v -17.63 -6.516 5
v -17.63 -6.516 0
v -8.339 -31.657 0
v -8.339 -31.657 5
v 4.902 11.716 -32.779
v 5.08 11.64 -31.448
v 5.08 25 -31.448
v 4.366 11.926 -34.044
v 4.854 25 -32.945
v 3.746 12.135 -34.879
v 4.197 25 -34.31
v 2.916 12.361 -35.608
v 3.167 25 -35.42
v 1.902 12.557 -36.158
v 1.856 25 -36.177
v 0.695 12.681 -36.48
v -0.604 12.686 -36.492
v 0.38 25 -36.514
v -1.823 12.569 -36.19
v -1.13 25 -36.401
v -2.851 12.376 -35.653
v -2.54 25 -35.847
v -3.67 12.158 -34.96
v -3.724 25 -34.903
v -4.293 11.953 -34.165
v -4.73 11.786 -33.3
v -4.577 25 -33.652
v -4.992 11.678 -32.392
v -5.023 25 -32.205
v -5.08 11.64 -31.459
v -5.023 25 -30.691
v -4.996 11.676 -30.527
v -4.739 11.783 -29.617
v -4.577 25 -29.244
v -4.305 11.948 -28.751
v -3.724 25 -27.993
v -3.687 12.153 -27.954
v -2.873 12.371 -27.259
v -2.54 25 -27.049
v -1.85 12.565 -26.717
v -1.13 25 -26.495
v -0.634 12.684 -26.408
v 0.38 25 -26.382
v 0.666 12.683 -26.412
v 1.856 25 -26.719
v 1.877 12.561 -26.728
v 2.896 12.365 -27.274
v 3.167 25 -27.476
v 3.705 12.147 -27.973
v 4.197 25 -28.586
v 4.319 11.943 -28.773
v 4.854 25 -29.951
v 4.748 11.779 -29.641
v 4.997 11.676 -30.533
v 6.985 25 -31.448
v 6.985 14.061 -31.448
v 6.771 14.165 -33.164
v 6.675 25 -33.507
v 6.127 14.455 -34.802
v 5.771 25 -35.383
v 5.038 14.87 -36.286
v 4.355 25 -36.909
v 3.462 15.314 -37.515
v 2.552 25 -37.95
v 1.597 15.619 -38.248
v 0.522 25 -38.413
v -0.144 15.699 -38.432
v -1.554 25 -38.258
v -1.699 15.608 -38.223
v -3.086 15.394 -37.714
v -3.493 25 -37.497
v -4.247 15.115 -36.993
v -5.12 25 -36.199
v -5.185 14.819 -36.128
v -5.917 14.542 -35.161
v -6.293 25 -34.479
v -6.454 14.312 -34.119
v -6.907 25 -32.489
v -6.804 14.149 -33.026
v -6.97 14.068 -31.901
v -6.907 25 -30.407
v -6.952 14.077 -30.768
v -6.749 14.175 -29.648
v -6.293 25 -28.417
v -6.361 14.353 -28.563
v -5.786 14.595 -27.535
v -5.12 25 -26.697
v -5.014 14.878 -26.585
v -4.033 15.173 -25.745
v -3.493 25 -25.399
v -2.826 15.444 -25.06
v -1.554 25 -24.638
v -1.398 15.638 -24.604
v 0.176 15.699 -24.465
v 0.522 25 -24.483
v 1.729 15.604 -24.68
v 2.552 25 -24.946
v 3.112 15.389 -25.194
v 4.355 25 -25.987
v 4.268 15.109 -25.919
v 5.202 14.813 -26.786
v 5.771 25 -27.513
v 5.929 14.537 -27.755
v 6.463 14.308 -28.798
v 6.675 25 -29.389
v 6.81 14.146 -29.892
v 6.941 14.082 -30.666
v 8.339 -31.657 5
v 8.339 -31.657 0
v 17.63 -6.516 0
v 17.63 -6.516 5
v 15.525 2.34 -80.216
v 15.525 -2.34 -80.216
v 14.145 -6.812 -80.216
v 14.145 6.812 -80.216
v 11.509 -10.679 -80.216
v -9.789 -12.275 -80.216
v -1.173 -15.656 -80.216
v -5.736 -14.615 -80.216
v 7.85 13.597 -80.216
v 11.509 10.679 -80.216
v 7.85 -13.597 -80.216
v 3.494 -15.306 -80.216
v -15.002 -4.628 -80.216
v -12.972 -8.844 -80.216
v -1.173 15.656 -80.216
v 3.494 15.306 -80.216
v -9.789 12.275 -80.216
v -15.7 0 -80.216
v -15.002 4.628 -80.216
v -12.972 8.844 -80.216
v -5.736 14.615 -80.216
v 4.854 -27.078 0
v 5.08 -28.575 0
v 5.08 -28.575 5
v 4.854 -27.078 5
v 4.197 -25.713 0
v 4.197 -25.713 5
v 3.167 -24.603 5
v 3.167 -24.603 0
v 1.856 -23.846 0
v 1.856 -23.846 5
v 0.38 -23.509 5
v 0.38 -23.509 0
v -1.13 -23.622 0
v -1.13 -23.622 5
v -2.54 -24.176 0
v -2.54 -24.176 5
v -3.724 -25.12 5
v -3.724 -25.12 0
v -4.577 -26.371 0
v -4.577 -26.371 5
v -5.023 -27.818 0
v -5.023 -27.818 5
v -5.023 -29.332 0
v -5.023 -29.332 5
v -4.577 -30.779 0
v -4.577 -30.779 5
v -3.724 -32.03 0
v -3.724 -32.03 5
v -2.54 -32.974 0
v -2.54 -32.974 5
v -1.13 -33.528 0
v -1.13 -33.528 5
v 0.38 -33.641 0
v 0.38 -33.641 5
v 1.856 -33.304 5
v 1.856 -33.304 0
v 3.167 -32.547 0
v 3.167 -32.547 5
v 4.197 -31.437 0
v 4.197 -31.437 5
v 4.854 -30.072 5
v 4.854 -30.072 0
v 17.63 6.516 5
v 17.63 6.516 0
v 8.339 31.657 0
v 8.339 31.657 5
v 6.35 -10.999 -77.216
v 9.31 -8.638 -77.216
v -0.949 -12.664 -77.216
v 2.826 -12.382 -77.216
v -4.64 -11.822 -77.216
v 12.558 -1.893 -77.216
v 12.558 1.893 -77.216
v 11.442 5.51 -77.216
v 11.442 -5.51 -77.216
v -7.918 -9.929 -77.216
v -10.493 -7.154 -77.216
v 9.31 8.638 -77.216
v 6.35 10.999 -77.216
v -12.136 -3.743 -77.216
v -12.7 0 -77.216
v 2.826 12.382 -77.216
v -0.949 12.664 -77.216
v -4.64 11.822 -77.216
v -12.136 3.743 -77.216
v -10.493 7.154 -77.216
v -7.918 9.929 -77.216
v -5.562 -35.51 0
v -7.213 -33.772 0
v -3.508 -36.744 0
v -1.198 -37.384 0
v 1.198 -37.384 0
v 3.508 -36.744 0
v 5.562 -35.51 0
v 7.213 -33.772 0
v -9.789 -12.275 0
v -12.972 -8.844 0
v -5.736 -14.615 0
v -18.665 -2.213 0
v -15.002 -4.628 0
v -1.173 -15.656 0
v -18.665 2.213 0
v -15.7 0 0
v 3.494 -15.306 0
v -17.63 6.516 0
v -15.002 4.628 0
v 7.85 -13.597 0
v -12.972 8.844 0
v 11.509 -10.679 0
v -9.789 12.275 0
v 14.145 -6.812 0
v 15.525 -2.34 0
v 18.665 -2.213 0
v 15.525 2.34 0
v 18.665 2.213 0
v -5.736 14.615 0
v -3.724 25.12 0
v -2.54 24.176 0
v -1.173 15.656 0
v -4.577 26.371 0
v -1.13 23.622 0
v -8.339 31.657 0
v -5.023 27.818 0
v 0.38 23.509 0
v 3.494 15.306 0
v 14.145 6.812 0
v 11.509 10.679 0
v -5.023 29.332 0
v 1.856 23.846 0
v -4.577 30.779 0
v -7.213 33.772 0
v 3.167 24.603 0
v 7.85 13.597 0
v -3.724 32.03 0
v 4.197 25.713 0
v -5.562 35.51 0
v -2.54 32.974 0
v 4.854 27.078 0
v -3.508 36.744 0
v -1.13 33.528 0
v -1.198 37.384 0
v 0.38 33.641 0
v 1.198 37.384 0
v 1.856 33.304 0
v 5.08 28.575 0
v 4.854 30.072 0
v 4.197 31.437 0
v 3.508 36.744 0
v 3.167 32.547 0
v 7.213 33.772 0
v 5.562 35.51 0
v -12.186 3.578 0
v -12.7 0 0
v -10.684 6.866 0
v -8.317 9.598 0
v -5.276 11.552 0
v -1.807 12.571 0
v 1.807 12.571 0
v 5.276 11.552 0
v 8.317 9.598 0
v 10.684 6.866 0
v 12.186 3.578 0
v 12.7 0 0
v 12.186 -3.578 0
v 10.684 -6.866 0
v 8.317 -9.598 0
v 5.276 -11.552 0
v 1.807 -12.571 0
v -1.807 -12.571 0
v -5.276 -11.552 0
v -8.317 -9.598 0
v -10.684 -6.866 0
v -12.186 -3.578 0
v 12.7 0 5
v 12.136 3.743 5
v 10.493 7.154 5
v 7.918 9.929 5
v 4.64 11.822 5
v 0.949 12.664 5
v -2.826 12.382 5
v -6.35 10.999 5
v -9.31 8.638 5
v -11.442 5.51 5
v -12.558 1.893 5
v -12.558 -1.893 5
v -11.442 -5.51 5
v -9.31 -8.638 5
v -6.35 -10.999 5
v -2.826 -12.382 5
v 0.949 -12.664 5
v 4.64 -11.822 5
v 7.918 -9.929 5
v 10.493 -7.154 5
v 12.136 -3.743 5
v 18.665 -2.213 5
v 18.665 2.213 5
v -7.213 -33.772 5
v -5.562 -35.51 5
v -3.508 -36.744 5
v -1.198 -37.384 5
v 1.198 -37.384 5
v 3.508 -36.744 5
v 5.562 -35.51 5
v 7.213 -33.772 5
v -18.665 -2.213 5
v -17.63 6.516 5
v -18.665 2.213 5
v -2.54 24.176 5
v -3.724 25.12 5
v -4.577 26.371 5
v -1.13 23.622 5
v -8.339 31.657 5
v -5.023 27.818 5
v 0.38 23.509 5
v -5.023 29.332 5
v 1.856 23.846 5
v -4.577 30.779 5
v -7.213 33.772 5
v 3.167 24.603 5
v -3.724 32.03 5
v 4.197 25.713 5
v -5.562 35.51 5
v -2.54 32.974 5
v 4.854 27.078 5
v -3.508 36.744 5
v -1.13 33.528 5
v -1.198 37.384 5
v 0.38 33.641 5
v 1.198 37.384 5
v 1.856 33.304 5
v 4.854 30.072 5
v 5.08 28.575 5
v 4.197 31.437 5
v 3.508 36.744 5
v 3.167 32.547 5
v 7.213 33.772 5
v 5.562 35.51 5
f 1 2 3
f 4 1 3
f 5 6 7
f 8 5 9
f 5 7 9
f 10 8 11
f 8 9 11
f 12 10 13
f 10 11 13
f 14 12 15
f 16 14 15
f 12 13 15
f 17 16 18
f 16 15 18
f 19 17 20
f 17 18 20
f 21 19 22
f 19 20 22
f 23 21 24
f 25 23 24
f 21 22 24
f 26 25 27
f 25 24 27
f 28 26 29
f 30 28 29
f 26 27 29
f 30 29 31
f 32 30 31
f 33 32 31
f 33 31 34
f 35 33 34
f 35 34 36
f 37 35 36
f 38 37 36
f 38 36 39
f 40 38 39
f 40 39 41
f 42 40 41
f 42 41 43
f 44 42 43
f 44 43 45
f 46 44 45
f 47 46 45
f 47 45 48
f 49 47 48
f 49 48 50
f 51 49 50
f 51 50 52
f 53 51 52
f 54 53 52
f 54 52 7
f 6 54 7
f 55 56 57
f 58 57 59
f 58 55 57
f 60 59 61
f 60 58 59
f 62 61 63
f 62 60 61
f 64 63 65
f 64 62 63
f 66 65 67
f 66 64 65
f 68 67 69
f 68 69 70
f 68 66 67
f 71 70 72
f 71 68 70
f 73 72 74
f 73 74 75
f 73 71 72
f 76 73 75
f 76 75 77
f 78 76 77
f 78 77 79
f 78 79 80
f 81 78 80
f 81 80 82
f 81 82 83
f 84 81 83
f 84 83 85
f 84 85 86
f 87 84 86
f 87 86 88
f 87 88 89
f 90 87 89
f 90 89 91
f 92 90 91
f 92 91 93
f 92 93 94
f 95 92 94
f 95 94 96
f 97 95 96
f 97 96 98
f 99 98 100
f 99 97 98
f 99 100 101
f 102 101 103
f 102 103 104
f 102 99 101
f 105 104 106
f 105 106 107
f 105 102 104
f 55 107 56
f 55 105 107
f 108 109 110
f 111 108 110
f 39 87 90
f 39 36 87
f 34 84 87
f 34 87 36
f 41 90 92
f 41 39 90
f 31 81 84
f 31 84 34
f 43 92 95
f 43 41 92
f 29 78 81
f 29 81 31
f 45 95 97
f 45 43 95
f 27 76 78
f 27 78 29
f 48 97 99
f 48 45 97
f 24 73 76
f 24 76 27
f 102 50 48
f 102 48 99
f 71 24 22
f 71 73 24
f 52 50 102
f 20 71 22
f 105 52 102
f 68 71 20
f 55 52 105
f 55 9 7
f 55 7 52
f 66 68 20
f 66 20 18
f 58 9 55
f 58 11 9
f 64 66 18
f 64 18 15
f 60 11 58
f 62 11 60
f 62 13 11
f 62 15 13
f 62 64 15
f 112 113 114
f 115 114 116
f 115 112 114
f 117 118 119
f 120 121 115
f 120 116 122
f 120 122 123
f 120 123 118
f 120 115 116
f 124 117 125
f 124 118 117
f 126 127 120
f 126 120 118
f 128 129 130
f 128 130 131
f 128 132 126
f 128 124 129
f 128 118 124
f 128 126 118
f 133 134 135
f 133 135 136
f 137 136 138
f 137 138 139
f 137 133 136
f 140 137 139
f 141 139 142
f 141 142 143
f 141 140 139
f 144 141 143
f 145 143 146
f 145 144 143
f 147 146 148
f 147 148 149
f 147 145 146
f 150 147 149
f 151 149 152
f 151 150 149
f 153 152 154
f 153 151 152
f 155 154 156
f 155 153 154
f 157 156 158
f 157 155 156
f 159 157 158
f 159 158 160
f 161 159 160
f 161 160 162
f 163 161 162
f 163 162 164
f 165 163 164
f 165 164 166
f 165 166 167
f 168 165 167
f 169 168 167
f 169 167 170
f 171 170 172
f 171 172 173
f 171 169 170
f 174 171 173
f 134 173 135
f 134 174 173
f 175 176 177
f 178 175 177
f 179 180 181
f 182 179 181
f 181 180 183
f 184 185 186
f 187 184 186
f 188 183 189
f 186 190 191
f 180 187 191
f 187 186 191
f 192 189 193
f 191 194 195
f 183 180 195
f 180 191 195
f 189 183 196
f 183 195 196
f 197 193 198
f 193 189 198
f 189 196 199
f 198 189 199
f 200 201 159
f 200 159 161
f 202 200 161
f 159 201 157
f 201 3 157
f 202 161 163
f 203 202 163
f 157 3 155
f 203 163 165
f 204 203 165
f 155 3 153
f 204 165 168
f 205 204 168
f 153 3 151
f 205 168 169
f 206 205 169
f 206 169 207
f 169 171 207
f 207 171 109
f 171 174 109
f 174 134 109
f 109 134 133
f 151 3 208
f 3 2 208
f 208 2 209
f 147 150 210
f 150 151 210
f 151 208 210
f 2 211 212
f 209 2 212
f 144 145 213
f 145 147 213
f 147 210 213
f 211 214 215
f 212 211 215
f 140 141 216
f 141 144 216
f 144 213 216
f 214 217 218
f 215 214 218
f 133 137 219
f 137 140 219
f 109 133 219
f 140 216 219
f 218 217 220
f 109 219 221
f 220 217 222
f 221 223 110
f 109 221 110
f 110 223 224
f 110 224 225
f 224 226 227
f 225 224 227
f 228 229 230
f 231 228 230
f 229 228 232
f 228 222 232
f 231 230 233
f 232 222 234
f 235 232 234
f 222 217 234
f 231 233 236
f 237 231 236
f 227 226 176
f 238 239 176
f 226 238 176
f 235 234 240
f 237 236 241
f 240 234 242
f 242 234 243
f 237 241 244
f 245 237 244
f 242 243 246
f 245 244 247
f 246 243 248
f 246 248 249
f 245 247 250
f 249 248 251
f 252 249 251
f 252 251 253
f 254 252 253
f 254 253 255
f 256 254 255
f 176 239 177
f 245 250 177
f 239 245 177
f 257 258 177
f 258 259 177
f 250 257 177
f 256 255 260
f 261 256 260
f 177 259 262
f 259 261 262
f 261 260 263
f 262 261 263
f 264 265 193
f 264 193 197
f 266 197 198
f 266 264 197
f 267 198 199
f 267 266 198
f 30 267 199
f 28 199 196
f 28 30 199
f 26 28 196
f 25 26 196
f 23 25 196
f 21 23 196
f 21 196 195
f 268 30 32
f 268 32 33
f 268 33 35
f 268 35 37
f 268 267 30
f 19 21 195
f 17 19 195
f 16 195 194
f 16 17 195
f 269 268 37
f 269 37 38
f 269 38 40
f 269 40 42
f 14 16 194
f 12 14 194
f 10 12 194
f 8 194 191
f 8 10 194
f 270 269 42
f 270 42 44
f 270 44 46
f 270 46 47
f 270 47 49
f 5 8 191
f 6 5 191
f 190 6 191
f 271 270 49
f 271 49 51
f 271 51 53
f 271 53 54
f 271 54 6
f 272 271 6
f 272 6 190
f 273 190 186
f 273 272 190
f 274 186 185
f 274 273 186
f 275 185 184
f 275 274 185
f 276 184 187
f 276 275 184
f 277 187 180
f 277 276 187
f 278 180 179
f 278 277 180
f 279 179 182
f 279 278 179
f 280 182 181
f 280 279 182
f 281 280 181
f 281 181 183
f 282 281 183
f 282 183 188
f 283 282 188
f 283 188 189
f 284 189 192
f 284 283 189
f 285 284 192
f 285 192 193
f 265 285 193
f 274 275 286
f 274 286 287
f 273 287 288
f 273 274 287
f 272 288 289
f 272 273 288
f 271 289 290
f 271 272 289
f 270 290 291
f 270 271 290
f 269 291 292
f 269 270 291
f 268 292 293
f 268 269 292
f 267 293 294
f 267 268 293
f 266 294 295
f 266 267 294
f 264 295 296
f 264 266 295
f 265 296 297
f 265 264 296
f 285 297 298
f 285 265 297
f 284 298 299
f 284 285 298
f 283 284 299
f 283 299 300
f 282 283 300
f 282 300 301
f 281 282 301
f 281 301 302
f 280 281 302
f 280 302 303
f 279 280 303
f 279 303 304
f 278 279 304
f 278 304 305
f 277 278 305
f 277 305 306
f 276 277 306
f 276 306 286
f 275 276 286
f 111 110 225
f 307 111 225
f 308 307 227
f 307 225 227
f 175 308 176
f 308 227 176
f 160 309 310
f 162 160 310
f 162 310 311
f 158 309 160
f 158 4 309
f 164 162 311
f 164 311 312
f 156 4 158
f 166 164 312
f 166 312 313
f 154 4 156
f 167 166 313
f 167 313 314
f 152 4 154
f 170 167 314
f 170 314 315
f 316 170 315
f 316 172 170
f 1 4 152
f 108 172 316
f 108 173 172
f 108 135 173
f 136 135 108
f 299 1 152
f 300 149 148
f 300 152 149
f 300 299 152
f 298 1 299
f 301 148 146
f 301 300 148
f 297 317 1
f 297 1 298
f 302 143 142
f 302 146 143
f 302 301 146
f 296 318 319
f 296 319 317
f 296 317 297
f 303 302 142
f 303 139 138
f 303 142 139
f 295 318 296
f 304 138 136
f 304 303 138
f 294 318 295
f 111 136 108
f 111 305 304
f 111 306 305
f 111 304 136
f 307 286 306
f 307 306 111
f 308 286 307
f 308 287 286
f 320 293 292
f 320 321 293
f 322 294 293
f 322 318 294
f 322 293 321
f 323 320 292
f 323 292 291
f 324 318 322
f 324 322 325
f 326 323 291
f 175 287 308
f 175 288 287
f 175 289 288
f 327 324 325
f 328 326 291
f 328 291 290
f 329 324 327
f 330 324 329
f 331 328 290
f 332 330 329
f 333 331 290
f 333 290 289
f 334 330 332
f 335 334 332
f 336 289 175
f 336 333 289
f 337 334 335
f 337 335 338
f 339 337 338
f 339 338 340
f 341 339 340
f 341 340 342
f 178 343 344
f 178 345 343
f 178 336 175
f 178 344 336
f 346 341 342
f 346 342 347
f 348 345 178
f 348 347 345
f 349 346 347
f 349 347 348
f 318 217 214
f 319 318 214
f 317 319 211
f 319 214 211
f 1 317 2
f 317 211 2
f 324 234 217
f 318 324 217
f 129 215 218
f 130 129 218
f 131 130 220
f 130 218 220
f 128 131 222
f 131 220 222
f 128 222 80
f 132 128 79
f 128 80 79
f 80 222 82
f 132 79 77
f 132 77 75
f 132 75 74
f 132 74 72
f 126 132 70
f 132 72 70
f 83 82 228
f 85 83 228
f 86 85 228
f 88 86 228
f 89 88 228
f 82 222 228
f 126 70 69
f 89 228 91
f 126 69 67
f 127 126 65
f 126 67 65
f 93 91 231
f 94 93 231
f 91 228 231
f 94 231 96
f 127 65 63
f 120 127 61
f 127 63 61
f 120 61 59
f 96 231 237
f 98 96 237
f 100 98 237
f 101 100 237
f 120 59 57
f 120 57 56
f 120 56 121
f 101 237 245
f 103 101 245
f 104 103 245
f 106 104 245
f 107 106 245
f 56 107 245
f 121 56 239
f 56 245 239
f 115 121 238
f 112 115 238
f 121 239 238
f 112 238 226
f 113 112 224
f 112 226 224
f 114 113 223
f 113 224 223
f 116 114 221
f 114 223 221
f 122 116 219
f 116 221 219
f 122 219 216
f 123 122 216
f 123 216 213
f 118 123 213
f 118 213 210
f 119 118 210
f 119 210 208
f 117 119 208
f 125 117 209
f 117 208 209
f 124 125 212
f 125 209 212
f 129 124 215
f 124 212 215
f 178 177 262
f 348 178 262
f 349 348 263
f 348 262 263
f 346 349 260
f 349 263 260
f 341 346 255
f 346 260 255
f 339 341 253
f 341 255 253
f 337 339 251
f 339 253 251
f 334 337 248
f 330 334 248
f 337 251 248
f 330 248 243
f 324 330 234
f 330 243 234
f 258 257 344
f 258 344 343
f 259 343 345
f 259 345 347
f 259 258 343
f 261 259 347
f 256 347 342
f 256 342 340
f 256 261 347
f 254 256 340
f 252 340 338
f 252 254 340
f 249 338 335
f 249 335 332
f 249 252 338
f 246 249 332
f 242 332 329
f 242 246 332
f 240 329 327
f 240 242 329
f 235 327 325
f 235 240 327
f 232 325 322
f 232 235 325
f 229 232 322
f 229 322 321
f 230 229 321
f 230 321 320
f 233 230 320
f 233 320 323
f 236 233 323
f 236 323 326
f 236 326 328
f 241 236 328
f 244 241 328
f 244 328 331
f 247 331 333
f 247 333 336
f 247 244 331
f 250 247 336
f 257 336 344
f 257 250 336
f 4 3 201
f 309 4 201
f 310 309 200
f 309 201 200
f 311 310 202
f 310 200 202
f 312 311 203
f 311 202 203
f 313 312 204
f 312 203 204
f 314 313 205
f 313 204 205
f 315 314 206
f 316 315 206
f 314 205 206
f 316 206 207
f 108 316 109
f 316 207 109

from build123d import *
from build123d.topology import SkipClean

# Parameters (mm, degrees)
SKETCH1_R                = 5.08
SKETCH1_R_2              = 12.7
BOSS_EXTRUDE1_DEPTH      = 5
BOSS_EXTRUDE2_START      = 77.216
SKETCH2_R                = 15.7
SKETCH2_R_2              = 12.7
BOSS_EXTRUDE2_DEPTH      = 77.216
BOSS_EXTRUDE3_START      = 3
SKETCH3_R                = 15.7
BOSS_EXTRUDE3_DEPTH      = 3
BOSS_EXTRUDE5_REACH      = 105.391
BOSS_EXTRUDE5_END_RADIUS = 15.7
SKETCH4_R                = 6.985
CUT_EXTRUDE1_REACH       = 105.391
CUT_EXTRUDE1_END_RADIUS  = 12.7
SKETCH4_5_R              = 5.08


with BuildPart() as part:
    # Sketch1 → Boss-Extrude1 (new body)
    with BuildSketch(Plane.XY):
        with BuildLine():
            Line((17.630429803, 6.515946667), (8.338716799, 31.656866667))
            ThreePointArc((8.338716799, 31.656866667), (0, 37.465), (-8.338716799, 31.656866667))
            Line((-8.338716799, 31.656866667), (-17.630429803, 6.515946667))
            ThreePointArc((-17.630429803, 6.515946667), (-18.796, 0), (-17.630429803, -6.515946667))
            Line((-17.630429803, -6.515946667), (-8.338716799, -31.656866667))
            ThreePointArc((-8.338716799, -31.656866667), (0, -37.465), (8.338716799, -31.656866667))
            Line((8.338716799, -31.656866667), (17.630429803, -6.515946667))
            ThreePointArc((17.630429803, -6.515946667), (18.796, 0), (17.630429803, 6.515946667))
        make_face()
        with Locations((0, 28.575)):
            Circle(SKETCH1_R, mode=Mode.SUBTRACT)
        Circle(SKETCH1_R_2, mode=Mode.SUBTRACT)
        with Locations((0, -28.575)):
            Circle(SKETCH1_R, mode=Mode.SUBTRACT)
    extrude(amount=BOSS_EXTRUDE1_DEPTH)

    # Sketch2 → Boss-Extrude2 (add)
    with SkipClean():  # the faces are left unmerged after this step: merging them gives an invalid solid
        with BuildSketch(Plane(origin=(0, 0, 0), x_dir=(-1, 0, 0), z_dir=(0, 0, -1)).offset(BOSS_EXTRUDE2_START)):
            Circle(SKETCH2_R)
            Circle(SKETCH2_R_2, mode=Mode.SUBTRACT)
        extrude(amount=-BOSS_EXTRUDE2_DEPTH)

    # Sketch3 → Boss-Extrude3 (add)
    with SkipClean():  # the faces are left unmerged after this step: merging them gives an invalid solid
        with BuildSketch(Plane(origin=(0, 0, -77.216), x_dir=(-1, 0, 0), z_dir=(0, 0, -1)).offset(BOSS_EXTRUDE3_START)):
            Circle(SKETCH3_R)
        extrude(amount=-BOSS_EXTRUDE3_DEPTH)

    # Boss-Extrude5: up to this cylinder (the profile starts outside it)
    with SkipClean():  # the faces are left unmerged after this step: merging them gives an invalid solid
        boss_extrude5_end = Plane(origin=(0, 0, -31.448), z_dir=(0, 0, 1)) * Cylinder(BOSS_EXTRUDE5_END_RADIUS, 243.182, mode=Mode.PRIVATE)
        # Sketch4 → Boss-Extrude5 (add, up to the surface)
        with BuildSketch(Plane(origin=(0, 25, 0), x_dir=(1, 0, 0), z_dir=(0, 1, 0)), mode=Mode.PRIVATE) as boss_extrude5_sk1:
            with Locations((0, 31.448)):
                Circle(SKETCH4_R)
        boss_extrude5_tool1 = extrude(boss_extrude5_sk1.sketch, amount=-BOSS_EXTRUDE5_REACH, mode=Mode.PRIVATE) - boss_extrude5_end
        add(boss_extrude5_tool1.solids().sort_by_distance((0, 25, -31.448))[0])

    # Cut-Extrude1: up to this cylinder (the profile starts outside it)
    with SkipClean():  # the faces are left unmerged after this step: merging them gives an invalid solid
        cut_extrude1_end = Plane(origin=(0, 0, -31.448), z_dir=(0, 0, -1)) * Cylinder(CUT_EXTRUDE1_END_RADIUS, 237.182, mode=Mode.PRIVATE)
        # Sketch4<5> → Cut-Extrude1 (cut, up to the surface)
        with BuildSketch(Plane(origin=(0, 25, 0), x_dir=(1, 0, 0), z_dir=(0, 1, 0)), mode=Mode.PRIVATE) as cut_extrude1_sk1:
            with Locations((0, 31.448)):
                Circle(SKETCH4_5_R)
        cut_extrude1_tool1 = extrude(cut_extrude1_sk1.sketch, amount=-CUT_EXTRUDE1_REACH, mode=Mode.PRIVATE) - cut_extrude1_end
        add(cut_extrude1_tool1.solids().sort_by_distance((0, 25, -31.448))[0], mode=Mode.SUBTRACT)


solid = part.part
